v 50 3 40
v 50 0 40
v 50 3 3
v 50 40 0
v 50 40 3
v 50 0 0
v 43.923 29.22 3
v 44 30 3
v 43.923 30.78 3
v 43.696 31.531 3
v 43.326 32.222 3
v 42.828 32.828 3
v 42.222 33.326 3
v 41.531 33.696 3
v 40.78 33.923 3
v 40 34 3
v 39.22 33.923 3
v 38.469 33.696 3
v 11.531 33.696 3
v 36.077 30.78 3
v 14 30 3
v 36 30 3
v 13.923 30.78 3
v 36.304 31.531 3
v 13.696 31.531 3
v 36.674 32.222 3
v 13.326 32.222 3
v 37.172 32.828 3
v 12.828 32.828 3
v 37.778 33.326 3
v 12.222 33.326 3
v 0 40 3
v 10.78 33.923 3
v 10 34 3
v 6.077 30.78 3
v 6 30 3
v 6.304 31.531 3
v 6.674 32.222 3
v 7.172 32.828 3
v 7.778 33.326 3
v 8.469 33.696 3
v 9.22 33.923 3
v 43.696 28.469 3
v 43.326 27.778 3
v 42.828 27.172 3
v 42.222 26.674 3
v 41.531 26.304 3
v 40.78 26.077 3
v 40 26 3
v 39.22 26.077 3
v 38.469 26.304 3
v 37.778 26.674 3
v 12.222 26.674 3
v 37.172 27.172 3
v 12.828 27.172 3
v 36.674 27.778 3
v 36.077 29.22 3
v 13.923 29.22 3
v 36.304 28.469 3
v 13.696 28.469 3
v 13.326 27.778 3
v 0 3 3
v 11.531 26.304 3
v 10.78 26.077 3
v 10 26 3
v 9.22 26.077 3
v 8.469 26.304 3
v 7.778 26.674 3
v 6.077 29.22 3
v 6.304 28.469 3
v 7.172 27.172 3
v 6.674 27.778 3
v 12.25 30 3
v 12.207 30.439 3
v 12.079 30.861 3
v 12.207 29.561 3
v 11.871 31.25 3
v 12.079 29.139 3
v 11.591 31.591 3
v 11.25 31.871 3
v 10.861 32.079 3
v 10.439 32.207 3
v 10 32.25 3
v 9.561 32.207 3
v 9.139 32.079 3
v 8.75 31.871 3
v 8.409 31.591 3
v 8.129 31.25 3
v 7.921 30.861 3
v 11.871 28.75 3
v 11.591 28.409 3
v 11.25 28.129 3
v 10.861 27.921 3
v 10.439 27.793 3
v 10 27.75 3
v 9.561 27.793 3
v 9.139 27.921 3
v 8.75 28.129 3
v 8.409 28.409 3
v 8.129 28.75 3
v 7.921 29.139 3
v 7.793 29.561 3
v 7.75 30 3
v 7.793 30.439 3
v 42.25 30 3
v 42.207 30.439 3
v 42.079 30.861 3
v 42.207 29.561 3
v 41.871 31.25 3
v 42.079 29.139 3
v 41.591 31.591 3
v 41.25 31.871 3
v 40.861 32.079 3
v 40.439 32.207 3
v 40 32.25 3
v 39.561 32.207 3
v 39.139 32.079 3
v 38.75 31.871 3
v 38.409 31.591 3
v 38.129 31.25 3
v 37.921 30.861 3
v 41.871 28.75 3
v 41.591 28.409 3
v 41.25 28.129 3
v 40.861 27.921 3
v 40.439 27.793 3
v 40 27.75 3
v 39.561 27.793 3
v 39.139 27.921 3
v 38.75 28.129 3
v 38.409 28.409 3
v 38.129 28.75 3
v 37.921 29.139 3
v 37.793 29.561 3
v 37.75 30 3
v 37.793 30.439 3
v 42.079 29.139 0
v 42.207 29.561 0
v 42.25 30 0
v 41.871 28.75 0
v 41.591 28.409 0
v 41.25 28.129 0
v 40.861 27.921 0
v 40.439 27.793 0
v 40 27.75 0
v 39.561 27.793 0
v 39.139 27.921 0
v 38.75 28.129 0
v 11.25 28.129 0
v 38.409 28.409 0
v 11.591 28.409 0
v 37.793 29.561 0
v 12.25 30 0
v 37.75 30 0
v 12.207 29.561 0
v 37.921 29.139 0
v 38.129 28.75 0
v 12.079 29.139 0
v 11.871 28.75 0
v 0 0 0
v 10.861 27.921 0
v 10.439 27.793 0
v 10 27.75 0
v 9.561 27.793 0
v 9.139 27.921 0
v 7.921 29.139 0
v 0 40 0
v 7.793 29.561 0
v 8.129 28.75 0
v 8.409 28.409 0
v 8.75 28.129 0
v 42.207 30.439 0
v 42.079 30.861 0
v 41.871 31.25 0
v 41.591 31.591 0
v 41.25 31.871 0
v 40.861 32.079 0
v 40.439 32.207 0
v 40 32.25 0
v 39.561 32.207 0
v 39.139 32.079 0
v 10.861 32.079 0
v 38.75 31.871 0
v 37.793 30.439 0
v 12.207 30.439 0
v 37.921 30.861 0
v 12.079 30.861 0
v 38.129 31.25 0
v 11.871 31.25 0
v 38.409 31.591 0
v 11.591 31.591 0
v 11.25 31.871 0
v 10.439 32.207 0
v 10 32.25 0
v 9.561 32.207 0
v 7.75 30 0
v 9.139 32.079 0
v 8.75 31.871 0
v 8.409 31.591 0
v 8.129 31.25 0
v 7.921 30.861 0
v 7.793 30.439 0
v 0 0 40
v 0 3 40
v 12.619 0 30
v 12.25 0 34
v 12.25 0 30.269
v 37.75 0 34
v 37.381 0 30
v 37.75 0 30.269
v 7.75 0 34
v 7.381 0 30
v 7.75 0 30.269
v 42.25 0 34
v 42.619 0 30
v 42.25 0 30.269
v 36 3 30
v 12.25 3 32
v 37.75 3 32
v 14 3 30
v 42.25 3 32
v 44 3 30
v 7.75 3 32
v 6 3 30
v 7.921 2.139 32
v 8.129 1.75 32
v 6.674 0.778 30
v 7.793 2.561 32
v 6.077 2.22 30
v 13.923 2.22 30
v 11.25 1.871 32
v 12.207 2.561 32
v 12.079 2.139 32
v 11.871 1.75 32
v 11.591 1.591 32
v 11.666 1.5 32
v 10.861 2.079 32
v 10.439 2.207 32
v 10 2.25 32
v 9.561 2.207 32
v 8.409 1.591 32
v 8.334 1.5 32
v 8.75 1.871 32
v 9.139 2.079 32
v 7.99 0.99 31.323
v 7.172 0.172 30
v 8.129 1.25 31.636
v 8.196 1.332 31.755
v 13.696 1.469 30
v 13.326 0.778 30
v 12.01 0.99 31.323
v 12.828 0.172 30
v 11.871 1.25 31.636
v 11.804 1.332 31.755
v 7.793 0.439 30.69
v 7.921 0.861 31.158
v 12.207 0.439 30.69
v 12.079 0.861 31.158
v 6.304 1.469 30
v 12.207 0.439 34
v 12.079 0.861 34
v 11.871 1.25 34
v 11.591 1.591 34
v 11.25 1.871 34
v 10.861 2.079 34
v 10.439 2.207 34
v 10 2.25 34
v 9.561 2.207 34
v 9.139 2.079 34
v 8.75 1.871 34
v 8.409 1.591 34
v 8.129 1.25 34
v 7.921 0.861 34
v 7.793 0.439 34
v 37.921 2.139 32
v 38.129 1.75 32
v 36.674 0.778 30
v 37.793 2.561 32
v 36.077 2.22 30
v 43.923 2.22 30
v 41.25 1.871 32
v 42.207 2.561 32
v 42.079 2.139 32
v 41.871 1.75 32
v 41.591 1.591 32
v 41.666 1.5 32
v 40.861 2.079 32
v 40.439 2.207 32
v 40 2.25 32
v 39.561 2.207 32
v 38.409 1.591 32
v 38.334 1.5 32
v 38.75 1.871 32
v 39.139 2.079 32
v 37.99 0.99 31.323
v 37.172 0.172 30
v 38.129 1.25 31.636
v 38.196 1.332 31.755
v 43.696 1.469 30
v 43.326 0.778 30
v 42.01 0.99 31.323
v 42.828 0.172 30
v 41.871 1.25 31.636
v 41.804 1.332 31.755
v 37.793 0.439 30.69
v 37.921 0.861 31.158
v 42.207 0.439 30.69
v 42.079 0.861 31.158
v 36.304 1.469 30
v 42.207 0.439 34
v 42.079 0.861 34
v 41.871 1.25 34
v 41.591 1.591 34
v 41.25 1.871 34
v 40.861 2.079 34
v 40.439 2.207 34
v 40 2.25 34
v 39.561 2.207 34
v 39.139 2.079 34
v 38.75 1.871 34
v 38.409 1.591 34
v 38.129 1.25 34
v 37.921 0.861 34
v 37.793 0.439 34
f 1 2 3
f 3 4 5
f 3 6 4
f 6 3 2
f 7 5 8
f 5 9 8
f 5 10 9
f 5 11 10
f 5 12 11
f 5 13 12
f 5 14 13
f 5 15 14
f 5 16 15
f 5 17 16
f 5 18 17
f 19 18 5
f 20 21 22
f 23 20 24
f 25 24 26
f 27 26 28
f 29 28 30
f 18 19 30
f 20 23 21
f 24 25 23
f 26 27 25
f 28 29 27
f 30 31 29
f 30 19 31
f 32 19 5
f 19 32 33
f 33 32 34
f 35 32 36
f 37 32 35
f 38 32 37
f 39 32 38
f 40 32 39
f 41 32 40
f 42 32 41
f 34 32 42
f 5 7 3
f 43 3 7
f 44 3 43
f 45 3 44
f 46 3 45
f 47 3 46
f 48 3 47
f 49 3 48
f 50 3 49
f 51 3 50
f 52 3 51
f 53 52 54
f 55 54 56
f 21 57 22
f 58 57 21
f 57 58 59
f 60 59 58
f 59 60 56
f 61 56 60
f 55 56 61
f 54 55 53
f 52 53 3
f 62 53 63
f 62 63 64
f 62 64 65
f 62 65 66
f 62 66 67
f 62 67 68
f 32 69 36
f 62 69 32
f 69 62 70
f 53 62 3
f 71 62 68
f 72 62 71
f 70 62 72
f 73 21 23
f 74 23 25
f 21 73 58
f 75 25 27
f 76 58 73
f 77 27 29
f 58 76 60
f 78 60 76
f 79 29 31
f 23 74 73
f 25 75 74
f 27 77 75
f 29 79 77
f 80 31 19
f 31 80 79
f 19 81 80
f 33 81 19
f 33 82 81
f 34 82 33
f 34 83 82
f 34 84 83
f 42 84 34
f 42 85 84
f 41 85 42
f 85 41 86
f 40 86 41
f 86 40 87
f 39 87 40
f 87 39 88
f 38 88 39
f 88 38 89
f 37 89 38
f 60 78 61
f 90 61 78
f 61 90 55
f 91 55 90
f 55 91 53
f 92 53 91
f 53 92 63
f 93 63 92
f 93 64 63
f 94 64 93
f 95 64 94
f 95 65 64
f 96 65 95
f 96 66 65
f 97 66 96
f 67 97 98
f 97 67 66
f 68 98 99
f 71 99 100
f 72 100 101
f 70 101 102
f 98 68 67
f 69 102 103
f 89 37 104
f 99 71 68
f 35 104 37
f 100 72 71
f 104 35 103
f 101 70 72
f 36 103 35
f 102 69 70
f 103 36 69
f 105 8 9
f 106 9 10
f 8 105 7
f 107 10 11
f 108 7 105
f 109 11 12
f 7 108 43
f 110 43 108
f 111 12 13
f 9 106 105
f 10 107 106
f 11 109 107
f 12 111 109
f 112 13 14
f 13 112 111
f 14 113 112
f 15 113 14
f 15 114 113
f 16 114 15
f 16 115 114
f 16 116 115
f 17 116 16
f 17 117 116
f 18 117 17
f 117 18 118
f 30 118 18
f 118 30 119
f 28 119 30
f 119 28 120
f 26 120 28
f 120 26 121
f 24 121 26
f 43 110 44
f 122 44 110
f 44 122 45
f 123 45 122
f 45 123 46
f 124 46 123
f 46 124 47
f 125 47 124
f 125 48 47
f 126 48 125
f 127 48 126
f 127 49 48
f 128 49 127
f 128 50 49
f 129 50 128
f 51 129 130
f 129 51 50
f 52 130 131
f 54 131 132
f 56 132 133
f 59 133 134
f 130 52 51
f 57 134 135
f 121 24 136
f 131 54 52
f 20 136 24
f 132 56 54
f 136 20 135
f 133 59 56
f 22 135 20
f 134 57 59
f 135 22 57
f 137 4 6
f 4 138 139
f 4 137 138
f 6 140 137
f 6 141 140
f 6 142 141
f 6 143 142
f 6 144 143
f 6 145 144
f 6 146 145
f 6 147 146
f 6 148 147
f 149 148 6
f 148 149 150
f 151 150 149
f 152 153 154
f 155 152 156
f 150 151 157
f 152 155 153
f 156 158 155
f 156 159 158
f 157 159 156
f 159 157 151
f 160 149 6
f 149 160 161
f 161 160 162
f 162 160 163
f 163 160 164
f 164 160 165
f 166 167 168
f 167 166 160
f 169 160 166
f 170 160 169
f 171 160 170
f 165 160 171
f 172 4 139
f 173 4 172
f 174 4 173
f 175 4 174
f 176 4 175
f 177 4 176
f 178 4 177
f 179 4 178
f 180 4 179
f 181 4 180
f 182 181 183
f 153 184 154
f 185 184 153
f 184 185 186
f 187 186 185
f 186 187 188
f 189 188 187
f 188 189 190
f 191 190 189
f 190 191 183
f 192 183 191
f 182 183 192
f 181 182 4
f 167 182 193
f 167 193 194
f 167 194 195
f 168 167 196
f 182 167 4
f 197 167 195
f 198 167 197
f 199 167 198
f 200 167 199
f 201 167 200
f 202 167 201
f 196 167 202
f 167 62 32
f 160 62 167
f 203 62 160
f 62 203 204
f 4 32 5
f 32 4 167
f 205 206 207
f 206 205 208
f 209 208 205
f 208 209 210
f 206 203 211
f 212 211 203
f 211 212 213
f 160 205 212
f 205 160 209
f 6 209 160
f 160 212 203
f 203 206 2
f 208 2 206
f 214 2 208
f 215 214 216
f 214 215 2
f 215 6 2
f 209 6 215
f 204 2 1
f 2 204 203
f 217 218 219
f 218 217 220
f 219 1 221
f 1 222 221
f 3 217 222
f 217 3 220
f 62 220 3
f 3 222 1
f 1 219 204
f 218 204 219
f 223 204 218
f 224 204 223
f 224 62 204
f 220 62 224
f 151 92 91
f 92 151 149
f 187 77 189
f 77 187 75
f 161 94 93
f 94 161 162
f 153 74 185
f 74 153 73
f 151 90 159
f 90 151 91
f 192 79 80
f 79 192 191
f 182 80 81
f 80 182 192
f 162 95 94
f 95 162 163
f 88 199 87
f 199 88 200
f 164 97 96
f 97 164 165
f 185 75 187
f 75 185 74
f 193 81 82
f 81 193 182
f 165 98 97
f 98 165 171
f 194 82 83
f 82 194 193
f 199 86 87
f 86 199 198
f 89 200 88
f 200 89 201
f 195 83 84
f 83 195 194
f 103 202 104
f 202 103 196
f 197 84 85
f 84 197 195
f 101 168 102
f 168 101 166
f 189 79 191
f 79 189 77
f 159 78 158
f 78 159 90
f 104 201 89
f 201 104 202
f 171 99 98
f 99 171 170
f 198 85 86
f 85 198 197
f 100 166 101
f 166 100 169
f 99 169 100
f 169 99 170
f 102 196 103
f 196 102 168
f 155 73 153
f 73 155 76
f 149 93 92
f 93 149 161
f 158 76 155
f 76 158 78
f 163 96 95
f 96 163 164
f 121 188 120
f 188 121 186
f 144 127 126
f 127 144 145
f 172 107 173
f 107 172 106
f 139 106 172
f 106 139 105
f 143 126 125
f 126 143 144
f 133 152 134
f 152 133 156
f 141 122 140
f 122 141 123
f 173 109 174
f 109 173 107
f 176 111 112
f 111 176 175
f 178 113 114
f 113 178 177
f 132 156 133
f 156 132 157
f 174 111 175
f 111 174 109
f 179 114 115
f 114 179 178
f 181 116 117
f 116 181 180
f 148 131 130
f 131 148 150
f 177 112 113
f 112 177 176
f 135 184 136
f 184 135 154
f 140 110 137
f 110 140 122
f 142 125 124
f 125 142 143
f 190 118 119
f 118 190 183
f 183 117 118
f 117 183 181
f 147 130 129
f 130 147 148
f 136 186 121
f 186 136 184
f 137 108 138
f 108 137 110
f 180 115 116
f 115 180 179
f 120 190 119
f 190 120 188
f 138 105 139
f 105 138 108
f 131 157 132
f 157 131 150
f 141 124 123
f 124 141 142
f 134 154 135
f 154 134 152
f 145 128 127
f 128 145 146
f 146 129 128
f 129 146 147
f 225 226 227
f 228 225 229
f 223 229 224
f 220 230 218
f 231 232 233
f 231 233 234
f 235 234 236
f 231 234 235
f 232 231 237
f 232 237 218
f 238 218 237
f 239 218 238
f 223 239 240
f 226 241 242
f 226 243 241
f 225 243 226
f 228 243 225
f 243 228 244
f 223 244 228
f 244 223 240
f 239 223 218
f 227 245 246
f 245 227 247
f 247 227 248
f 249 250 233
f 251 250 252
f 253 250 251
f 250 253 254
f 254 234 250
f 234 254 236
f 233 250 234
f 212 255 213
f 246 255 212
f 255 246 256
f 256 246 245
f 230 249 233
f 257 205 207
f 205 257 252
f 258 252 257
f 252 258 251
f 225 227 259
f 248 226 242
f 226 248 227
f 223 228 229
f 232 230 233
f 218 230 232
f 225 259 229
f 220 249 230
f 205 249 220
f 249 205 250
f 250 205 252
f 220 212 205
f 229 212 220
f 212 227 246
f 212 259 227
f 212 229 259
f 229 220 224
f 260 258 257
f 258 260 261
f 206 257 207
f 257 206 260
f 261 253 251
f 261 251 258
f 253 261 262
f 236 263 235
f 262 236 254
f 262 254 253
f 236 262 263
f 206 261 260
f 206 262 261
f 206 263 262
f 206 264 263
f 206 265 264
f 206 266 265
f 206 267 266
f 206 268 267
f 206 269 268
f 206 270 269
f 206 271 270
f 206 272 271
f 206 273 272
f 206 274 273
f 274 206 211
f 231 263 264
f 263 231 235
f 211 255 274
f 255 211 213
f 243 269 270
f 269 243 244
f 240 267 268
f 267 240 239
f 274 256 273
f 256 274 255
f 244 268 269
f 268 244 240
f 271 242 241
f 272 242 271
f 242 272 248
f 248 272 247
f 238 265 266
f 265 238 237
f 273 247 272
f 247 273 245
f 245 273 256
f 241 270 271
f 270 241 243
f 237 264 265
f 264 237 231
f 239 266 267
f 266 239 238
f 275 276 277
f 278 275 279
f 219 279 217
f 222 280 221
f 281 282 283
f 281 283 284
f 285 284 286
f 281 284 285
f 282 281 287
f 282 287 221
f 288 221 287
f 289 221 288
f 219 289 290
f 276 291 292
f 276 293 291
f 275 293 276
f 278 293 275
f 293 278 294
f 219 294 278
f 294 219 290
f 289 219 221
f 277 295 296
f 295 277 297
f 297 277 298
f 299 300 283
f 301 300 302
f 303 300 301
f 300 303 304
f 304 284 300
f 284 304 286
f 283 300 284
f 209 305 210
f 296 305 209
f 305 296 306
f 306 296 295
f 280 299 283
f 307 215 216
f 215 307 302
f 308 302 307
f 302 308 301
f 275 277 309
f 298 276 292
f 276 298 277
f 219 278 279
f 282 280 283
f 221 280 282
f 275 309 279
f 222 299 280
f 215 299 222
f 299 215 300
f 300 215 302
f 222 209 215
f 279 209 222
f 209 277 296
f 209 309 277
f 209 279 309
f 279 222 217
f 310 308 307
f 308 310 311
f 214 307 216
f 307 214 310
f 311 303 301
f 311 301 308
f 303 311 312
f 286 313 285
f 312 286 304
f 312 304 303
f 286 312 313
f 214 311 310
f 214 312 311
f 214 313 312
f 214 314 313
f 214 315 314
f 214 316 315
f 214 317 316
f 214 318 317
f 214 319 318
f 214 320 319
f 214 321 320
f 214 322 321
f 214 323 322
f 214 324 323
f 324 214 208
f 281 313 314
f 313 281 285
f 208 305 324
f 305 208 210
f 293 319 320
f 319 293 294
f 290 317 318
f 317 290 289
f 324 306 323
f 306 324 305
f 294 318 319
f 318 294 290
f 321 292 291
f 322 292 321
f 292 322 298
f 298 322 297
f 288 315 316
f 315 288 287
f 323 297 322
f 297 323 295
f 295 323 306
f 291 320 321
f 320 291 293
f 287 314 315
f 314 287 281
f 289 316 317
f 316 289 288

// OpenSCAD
// L-bracket parameters
width = 50;
depth = 40;
thickness = 3;

// Hole parameters
hole_diameter = 4.5;
countersink_diameter = 8;
countersink_depth = 2;

// Final assembly
difference() {
    // Bracket geometry
    union() {
        // Horizontal plate: X=width, Y=depth, Z=thickness
        cube([width, depth, thickness]);
        // Vertical plate: X=width, Y=thickness, Z=depth
        cube([width, thickness, depth]);
    }

    // Holes on the Horizontal face (Top surface: Z = thickness)
    // X positions: 10mm and 40mm (Symmetrical, 10mm from edges 0 and 50)
    // Y position: 30mm (10mm from edge 40)
    for (x = [10, 40]) {
        translate([x, depth - 10, thickness]) {
            // Countersink seat (outward in +Z direction)
            cylinder(d1=countersink_diameter, d2=hole_diameter, h=countersink_depth, $fn=32);
            // Through hole (inward in -Z direction)
            translate([0, 0, -thickness]) 
                cylinder(d=hole_diameter, h=thickness + 1, $fn=32);
        }
    }

    // Holes on the Vertical face (Side surface: Y = thickness)
    // X positions: 10mm and 40mm
    // Z position: 30mm (10mm from edge 40)
    for (x = [10, 40]) {
        translate([x, thickness, depth - 10]) {
            // Countersink seat (outward in +Y direction)
            cylinder(d1=countersink_diameter, d2=hole_diameter, h=countersink_depth, $fn=32);
            // Through hole (inward in -Y direction)
            translate([0, -thickness, 0]) 
                cylinder(d=hole_diameter, h=thickness + 1, $fn=32);
        }
    }
}
